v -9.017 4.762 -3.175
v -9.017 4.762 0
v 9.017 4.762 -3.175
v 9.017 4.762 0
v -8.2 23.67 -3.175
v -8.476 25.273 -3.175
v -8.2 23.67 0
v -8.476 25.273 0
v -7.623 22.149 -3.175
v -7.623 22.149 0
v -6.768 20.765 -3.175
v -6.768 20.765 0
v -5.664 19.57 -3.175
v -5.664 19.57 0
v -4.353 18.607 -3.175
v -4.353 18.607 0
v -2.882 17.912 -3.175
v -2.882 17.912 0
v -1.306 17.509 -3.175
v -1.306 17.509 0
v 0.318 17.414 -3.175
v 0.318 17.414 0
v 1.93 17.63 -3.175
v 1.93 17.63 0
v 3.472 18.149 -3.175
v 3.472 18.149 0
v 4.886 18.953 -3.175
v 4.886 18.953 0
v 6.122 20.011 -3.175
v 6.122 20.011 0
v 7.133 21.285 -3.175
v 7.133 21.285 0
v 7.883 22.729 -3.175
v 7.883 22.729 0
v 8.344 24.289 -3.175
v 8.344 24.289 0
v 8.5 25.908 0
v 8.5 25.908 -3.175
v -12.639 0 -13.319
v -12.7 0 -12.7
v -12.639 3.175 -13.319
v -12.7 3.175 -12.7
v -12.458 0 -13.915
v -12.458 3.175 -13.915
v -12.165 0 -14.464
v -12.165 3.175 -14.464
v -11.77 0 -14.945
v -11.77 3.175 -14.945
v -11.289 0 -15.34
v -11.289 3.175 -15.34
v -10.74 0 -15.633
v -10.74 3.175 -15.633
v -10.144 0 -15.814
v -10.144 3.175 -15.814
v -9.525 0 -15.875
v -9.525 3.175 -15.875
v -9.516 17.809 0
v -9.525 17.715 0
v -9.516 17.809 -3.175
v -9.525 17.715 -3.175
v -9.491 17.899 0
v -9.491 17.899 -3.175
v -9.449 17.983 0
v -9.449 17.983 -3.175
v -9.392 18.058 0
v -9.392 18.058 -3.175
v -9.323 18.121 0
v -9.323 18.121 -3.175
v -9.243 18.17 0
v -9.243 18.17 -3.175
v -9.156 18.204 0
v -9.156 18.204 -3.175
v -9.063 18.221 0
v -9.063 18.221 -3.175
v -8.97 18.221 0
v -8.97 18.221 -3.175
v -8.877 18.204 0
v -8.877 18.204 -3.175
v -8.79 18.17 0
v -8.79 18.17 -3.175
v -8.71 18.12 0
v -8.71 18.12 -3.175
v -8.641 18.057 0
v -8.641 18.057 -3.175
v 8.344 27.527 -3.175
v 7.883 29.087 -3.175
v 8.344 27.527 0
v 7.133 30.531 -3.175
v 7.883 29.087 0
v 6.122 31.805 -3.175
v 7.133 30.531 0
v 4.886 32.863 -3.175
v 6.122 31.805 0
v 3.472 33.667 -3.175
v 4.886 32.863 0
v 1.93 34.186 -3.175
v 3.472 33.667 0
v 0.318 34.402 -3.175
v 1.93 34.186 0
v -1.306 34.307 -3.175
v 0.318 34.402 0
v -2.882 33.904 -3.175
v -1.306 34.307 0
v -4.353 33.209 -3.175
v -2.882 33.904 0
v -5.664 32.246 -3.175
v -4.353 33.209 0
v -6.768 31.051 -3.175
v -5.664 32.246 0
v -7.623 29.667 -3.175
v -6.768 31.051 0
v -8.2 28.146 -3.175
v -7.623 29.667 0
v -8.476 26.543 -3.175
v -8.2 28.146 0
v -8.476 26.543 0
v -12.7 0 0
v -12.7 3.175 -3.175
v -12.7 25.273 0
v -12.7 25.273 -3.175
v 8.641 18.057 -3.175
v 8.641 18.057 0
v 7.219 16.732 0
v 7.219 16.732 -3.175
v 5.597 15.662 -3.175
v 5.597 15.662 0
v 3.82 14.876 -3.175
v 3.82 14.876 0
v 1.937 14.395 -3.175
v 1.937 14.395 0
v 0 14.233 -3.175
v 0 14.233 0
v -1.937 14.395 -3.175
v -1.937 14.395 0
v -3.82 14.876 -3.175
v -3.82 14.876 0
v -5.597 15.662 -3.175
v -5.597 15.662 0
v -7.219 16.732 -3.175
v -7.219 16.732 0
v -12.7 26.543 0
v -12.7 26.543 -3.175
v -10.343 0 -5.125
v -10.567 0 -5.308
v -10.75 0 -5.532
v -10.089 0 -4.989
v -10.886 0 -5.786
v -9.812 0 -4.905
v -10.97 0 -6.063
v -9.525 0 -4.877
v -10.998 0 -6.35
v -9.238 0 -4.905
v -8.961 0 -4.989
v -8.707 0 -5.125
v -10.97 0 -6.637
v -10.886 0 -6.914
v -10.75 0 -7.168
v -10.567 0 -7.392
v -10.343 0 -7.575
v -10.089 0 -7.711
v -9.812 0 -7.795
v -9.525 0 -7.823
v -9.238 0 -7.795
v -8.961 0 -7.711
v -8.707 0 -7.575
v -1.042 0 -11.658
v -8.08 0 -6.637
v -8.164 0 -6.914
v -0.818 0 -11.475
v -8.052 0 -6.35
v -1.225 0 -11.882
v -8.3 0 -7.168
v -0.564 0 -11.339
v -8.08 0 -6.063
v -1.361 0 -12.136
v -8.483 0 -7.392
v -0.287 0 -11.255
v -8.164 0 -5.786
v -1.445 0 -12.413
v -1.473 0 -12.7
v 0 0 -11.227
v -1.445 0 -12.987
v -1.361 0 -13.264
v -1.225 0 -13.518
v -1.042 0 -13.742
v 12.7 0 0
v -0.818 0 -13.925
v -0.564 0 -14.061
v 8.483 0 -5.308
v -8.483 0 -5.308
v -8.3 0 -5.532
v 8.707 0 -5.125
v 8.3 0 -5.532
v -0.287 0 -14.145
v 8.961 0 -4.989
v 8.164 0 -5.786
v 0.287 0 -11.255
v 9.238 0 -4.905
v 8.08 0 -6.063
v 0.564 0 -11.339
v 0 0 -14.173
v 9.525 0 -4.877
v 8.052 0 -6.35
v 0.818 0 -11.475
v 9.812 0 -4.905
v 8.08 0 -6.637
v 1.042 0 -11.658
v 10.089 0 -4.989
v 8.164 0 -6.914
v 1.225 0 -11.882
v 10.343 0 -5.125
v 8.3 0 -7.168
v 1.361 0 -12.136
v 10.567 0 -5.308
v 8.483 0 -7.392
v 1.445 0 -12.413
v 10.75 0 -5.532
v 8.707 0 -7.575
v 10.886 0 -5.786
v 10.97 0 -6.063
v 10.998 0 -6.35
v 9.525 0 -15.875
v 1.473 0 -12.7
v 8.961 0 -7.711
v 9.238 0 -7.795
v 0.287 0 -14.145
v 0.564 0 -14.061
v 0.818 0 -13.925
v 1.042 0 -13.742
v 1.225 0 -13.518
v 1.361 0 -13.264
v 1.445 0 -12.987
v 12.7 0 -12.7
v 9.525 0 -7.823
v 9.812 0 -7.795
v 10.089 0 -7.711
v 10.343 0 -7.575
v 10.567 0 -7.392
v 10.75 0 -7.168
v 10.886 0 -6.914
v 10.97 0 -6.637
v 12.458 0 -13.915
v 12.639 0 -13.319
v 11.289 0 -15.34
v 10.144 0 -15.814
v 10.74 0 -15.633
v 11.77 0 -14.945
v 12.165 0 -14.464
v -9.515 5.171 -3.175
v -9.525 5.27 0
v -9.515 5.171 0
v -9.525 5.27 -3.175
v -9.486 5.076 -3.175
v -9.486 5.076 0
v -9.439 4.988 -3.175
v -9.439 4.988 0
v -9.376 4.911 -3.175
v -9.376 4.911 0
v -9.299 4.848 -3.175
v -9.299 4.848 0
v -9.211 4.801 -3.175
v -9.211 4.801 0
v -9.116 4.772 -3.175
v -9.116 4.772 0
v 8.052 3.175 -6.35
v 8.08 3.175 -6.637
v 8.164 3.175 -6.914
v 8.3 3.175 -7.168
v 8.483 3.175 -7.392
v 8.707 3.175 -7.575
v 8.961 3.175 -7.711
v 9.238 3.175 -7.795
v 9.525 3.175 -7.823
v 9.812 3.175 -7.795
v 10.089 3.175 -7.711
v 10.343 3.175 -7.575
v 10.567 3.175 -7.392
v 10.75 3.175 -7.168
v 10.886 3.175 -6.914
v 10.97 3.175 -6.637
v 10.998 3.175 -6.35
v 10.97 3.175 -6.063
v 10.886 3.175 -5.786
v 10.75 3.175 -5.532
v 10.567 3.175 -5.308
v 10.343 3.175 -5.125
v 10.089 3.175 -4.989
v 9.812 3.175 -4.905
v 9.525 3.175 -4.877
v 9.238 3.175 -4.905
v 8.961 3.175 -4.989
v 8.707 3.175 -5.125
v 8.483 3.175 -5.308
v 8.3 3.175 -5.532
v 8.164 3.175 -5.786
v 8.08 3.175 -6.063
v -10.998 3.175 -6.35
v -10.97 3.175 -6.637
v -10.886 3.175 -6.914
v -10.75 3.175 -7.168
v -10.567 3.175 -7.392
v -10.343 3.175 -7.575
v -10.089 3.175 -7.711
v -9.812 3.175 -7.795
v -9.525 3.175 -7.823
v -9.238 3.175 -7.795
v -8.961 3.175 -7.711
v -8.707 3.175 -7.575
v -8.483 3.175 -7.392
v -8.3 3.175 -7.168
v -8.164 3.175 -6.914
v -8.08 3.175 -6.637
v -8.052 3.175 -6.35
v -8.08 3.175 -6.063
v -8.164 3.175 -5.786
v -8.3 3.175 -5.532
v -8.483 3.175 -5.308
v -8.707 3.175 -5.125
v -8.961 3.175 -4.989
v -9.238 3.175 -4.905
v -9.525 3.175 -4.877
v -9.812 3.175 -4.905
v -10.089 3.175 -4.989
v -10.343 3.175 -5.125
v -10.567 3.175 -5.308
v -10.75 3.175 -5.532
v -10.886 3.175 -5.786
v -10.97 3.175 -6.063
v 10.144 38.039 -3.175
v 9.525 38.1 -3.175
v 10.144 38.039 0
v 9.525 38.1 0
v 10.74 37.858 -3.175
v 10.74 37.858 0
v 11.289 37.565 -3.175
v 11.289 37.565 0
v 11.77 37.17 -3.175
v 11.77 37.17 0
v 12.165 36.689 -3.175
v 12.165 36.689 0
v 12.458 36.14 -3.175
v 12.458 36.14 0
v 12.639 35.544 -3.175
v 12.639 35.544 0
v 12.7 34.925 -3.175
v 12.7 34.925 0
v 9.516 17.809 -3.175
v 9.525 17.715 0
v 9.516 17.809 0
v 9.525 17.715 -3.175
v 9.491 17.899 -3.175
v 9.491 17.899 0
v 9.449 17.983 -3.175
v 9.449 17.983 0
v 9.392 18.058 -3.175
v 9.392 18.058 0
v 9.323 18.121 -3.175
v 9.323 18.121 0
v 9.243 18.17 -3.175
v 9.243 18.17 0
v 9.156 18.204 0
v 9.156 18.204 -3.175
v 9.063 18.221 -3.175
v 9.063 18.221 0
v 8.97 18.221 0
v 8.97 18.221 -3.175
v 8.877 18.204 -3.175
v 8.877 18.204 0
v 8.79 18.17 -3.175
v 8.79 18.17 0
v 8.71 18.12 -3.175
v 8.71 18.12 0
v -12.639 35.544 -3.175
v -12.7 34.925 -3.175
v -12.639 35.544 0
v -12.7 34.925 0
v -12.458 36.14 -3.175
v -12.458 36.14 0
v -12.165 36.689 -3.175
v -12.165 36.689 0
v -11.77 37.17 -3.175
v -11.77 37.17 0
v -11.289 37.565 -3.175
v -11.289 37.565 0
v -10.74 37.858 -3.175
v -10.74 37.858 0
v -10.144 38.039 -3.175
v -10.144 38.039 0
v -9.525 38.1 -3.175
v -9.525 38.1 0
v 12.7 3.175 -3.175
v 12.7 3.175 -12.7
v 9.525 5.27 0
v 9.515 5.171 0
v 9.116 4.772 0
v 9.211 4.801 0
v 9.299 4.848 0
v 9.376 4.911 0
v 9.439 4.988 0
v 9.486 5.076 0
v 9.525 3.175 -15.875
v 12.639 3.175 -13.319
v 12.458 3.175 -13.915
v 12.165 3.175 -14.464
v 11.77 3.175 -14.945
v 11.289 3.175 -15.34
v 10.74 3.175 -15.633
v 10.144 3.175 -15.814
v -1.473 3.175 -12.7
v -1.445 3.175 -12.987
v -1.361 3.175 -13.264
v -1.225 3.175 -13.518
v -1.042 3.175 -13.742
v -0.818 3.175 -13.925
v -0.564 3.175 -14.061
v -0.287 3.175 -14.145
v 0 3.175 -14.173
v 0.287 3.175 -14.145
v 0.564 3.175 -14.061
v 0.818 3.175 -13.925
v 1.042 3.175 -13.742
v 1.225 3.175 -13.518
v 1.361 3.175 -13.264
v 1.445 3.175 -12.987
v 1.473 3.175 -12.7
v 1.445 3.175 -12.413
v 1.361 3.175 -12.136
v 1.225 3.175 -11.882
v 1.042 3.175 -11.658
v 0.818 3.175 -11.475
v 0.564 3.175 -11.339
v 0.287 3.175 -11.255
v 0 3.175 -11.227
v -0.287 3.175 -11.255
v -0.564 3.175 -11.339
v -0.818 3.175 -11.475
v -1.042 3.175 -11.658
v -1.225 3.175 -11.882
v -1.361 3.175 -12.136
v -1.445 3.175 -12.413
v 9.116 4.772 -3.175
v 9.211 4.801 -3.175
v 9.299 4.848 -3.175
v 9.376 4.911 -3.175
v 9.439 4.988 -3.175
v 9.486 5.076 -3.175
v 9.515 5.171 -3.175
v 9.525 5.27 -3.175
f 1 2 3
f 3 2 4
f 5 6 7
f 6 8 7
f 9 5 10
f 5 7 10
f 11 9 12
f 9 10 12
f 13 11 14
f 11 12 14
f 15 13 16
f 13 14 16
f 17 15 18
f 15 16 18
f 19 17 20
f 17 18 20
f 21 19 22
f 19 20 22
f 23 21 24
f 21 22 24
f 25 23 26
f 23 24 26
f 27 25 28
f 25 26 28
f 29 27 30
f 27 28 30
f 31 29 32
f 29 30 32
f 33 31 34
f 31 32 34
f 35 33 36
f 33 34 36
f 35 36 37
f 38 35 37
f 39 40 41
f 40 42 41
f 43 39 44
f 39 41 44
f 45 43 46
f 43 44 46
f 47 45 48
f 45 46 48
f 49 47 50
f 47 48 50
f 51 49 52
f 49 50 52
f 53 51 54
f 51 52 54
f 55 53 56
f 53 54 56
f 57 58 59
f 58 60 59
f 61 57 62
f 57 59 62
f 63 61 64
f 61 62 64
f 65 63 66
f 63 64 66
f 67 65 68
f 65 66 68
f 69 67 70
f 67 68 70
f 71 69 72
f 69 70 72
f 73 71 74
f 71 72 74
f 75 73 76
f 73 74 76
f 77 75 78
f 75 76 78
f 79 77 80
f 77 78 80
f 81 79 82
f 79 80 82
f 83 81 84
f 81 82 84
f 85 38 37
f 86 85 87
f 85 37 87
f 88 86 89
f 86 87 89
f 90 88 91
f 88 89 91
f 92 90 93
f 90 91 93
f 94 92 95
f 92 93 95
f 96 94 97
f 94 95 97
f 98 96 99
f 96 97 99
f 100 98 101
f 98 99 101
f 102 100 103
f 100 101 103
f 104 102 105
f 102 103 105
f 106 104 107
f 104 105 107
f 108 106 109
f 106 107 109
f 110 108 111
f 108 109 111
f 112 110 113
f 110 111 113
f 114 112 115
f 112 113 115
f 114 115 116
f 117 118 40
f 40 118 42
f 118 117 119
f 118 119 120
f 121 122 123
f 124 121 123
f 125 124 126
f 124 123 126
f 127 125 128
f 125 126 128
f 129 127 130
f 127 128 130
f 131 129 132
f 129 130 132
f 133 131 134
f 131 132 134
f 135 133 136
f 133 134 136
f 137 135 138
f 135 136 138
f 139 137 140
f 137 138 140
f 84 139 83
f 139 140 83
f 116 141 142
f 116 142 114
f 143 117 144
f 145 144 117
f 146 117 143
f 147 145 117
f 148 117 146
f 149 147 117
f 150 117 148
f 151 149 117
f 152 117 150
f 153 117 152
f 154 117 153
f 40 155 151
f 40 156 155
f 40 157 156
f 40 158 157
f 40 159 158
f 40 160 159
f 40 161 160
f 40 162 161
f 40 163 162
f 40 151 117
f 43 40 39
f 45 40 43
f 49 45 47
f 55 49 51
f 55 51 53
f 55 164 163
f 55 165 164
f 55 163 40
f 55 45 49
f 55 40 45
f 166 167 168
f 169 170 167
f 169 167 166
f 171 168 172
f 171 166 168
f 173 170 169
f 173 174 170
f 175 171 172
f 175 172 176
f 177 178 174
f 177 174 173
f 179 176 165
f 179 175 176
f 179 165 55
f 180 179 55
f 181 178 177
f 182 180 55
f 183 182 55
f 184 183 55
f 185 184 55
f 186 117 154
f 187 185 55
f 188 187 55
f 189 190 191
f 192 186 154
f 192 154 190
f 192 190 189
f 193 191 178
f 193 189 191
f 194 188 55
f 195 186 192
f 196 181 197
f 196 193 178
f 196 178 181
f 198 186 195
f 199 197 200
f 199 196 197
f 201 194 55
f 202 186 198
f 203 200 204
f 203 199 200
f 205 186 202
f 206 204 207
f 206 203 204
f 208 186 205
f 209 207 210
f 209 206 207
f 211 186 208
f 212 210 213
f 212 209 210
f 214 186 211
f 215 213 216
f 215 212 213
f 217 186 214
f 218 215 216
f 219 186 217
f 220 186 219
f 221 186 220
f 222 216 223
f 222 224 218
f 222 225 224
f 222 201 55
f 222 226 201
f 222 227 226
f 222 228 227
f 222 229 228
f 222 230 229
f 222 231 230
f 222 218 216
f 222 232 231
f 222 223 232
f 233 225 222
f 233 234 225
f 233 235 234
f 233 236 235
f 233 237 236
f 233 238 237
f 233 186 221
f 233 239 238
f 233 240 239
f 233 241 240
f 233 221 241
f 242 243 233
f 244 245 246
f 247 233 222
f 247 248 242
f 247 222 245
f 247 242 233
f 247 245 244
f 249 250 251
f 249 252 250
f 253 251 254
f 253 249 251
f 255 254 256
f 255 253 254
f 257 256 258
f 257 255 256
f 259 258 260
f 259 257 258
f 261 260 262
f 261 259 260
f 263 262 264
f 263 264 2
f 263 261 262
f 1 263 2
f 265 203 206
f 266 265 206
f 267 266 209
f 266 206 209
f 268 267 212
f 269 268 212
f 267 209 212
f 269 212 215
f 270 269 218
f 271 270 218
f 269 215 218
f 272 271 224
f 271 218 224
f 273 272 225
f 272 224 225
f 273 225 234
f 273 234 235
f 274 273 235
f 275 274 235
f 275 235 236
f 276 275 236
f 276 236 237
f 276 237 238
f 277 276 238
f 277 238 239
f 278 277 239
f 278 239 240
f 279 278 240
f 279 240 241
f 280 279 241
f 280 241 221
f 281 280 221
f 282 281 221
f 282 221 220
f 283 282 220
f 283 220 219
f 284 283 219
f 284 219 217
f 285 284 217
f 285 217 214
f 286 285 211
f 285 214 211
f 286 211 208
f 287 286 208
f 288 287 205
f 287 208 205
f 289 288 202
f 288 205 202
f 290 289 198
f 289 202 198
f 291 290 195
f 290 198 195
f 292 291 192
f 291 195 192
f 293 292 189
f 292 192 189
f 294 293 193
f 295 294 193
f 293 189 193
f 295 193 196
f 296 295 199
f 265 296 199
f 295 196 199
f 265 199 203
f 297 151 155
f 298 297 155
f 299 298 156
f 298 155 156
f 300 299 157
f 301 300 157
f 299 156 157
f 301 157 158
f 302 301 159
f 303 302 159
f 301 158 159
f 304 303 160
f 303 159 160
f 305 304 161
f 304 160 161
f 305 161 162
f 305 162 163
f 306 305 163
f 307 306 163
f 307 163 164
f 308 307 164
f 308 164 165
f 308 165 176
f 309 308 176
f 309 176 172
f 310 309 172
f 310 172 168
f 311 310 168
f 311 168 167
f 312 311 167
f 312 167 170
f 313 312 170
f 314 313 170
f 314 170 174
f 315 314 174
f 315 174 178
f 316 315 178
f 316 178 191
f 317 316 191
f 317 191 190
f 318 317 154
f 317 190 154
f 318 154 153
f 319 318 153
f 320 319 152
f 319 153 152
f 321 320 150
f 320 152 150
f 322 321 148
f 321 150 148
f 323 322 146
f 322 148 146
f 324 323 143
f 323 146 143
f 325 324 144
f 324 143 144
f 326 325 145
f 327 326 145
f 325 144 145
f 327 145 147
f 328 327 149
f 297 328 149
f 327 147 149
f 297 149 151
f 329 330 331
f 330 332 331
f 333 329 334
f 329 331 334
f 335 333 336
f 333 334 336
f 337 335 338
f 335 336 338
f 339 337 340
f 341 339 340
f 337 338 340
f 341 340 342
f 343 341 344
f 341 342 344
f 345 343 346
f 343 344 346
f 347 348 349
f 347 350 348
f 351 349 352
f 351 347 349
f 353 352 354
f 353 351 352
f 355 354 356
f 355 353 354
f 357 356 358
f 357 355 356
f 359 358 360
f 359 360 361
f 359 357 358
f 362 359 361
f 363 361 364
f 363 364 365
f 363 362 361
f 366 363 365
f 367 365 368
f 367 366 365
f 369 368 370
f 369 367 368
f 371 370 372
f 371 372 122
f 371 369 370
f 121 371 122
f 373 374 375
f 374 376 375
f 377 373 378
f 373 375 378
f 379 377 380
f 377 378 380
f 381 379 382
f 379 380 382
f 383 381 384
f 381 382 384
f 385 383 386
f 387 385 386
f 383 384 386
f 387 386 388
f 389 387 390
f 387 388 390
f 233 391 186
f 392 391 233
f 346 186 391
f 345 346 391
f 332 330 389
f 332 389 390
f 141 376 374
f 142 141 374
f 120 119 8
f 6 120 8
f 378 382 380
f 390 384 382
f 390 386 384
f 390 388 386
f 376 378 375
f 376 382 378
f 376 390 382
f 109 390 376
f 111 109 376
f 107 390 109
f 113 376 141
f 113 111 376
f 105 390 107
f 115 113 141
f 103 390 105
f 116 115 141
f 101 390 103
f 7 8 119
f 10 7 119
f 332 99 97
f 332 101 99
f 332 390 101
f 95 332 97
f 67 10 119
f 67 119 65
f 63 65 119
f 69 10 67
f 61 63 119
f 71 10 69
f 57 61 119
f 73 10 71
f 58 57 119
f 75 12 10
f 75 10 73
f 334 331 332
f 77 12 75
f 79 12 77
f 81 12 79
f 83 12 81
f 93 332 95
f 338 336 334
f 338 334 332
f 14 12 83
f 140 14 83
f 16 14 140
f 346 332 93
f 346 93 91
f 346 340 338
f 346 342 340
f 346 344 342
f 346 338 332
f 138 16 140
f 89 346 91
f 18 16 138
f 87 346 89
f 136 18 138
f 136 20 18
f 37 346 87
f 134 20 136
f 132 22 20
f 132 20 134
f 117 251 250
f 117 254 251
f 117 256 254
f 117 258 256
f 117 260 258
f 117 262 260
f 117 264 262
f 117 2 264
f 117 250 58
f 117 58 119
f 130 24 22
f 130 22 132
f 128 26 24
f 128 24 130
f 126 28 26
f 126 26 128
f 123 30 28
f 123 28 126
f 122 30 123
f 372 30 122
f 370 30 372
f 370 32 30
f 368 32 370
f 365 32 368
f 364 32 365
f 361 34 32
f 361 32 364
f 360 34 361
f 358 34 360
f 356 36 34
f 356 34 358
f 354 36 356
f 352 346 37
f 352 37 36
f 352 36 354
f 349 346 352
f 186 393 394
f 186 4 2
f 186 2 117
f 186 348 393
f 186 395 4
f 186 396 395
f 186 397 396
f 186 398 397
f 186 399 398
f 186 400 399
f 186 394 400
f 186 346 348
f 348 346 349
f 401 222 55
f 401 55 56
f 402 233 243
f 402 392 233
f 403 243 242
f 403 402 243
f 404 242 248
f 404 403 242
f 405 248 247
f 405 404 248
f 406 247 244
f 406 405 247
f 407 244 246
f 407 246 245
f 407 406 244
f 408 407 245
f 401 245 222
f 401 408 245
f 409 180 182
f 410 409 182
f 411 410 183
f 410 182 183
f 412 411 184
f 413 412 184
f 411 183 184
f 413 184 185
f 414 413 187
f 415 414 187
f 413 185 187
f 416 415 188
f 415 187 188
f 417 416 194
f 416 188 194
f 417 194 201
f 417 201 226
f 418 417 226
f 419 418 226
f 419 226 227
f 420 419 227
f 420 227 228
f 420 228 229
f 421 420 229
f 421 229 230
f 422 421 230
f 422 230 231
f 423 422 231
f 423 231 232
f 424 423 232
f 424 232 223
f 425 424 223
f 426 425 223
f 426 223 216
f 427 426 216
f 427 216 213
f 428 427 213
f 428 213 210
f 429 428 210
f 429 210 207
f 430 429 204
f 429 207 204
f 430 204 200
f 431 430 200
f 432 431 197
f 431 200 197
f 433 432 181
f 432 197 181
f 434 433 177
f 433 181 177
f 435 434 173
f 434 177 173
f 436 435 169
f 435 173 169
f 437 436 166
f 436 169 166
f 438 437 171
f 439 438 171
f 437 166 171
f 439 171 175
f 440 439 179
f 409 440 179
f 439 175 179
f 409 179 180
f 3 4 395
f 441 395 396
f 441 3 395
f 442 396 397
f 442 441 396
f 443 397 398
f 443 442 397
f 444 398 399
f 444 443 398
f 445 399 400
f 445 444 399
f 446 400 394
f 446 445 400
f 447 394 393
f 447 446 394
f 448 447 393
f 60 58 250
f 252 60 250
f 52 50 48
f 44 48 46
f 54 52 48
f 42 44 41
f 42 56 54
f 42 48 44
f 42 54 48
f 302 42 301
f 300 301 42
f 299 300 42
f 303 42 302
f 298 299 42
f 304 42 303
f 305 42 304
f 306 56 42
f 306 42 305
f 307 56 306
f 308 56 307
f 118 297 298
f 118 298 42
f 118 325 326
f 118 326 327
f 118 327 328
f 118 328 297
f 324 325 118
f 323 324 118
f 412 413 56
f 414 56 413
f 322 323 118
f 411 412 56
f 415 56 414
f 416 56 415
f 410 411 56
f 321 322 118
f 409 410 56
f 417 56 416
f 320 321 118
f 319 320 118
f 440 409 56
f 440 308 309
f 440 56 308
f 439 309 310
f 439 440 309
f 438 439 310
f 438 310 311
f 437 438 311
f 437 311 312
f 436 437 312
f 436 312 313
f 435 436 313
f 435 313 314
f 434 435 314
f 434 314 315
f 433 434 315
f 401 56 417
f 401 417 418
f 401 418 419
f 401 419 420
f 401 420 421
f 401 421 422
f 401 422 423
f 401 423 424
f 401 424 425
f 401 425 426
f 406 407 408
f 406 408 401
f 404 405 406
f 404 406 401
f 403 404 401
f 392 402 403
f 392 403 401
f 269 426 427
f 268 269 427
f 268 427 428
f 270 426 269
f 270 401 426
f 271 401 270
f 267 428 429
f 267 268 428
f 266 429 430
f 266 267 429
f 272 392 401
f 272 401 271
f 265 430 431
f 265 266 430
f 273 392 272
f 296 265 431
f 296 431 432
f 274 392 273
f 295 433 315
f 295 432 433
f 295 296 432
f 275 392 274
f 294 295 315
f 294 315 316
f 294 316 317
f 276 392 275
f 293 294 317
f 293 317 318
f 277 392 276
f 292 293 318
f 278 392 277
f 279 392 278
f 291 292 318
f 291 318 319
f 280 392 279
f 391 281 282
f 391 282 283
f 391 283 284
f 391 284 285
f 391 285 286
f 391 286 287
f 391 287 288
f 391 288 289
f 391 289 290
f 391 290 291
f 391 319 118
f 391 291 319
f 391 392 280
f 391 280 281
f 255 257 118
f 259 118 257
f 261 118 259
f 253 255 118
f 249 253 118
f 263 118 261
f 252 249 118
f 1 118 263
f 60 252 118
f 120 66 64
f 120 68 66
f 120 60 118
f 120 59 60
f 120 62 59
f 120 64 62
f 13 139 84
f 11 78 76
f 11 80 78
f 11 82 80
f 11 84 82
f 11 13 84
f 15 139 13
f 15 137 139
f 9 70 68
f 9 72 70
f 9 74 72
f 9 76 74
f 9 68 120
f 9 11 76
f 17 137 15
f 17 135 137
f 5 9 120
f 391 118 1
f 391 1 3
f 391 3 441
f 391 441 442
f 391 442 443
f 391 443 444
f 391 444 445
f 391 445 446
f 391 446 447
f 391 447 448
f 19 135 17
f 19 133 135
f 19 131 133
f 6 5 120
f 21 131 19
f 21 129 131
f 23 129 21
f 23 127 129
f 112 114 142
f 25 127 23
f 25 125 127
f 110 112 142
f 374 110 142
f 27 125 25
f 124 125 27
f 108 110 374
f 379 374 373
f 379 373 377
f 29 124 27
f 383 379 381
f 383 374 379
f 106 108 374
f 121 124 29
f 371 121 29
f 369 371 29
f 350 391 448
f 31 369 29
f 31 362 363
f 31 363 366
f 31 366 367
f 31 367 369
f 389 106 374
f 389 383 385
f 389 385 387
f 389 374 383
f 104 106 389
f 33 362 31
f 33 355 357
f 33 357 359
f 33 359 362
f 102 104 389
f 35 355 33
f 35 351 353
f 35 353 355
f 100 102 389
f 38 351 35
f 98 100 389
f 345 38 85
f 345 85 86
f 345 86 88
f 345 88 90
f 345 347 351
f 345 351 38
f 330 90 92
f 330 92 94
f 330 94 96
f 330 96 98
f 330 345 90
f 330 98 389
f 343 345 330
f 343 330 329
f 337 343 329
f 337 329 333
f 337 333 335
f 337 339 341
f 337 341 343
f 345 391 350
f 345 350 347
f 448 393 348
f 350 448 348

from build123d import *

# Parameters (mm, degrees)
BOSS_EXTRUDE1_DEPTH   = 12.7
SKETCH2_R             = 8.5
CUT_EXTRUDE1_DEPTH    = 16.875
FILLET1_R             = 3.175
F_4_CLEARANCE_HOLE1_D = 2.9464
SKETCH5_W             = 24.88239846
SKETCH5_H             = 1.27
CUT_EXTRUDE2_DEPTH    = 16.875
CUT_EXTRUDE3_DEPTH    = 16.875
FILLET2_R             = 0.508


with BuildPart() as part:
    # Sketch1 → Boss-Extrude1 (new body, symmetric)
    with BuildSketch(Plane(origin=(0, 0, 0), x_dir=(0, 0, -1), z_dir=(1, 0, 0))):
        Polygon((0, 38.1), (0, 0), (15.875, 0), (15.875, 3.175), (3.175, 3.175), (3.175, 38.1), align=None)
    extrude(amount=BOSS_EXTRUDE1_DEPTH, both=True)

    # Sketch2 → Cut-Extrude1 (cut, through all)
    with BuildSketch(Plane.XY):
        with Locations((0, 25.908)):
            Circle(SKETCH2_R)
    extrude(amount=-CUT_EXTRUDE1_DEPTH, mode=Mode.SUBTRACT)

    # Fillet1
    fillet1_edges = [part.edges().sort_by_distance(p)[0] for p in [
        (12.7, 1.5875, -15.875),
        (12.7, 38.1, -1.5875),
        (-12.7, 1.5875, -15.875),
        (-12.7, 38.1, -1.5875),
    ]]
    fillet(fillet1_edges, radius=FILLET1_R)

    # #4 Clearance Hole1 (through all)
    with Locations(Plane(origin=(0, 3.175, 0), x_dir=(1, 0, 0), z_dir=(0, 1, 0))):
        with Locations((-9.525, 6.35), (0, 12.7), (9.525, 6.35)):
            Hole(F_4_CLEARANCE_HOLE1_D / 2)

    # Sketch5 → Cut-Extrude2 (cut, through all)
    with BuildSketch(Plane.XY):
        with Locations((-12.44119923, 25.908)):
            Rectangle(SKETCH5_W, SKETCH5_H)
    extrude(amount=-CUT_EXTRUDE2_DEPTH, mode=Mode.SUBTRACT)

    # Sketch6 → Cut-Extrude3 (cut, through all)
    with BuildSketch(Plane.XY):
        with BuildLine():
            Line((-9.525, 19.156703828), (-9.525, 4.7625))
            Line((-9.525, 4.7625), (9.525, 4.7625))
            Line((9.525, 4.7625), (9.525, 19.156703828))
            ThreePointArc((9.525, 19.156703828), (0, 14.233), (-9.525, 19.156703828))
        make_face()
    extrude(amount=-CUT_EXTRUDE3_DEPTH, mode=Mode.SUBTRACT)

    # Fillet2
    fillet2_edges = [part.edges().sort_by_distance(p)[0] for p in [
        (-9.525, 19.156703828, -1.5875),
        (9.525, 19.156703828, -1.5875),
        (9.525, 4.7625, -1.5875),
        (-9.525, 4.7625, -1.5875),
    ]]
    fillet(fillet2_edges, radius=FILLET2_R)


solid = part.part
